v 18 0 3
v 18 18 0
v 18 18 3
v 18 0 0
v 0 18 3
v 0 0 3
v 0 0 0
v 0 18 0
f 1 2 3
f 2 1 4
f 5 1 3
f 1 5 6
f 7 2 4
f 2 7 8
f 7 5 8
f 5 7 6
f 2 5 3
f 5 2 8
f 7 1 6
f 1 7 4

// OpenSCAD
difference() {
cube([18,18,3]);

translate([0,-2,2]) scale(1.2) linear_extrude(height = 4, center = true, convexity = 10) {
	for (k = [0:5:20]) {
		for (i = [0:3:18]) {
		   translate([k, i]) import (file = "egypt pattern.dxf");
		}
		for (j = [0:3:18]) {
			   translate([k + 2.5, j+1.5]) import (file = "egypt pattern.dxf");
		}
	}
}
}
